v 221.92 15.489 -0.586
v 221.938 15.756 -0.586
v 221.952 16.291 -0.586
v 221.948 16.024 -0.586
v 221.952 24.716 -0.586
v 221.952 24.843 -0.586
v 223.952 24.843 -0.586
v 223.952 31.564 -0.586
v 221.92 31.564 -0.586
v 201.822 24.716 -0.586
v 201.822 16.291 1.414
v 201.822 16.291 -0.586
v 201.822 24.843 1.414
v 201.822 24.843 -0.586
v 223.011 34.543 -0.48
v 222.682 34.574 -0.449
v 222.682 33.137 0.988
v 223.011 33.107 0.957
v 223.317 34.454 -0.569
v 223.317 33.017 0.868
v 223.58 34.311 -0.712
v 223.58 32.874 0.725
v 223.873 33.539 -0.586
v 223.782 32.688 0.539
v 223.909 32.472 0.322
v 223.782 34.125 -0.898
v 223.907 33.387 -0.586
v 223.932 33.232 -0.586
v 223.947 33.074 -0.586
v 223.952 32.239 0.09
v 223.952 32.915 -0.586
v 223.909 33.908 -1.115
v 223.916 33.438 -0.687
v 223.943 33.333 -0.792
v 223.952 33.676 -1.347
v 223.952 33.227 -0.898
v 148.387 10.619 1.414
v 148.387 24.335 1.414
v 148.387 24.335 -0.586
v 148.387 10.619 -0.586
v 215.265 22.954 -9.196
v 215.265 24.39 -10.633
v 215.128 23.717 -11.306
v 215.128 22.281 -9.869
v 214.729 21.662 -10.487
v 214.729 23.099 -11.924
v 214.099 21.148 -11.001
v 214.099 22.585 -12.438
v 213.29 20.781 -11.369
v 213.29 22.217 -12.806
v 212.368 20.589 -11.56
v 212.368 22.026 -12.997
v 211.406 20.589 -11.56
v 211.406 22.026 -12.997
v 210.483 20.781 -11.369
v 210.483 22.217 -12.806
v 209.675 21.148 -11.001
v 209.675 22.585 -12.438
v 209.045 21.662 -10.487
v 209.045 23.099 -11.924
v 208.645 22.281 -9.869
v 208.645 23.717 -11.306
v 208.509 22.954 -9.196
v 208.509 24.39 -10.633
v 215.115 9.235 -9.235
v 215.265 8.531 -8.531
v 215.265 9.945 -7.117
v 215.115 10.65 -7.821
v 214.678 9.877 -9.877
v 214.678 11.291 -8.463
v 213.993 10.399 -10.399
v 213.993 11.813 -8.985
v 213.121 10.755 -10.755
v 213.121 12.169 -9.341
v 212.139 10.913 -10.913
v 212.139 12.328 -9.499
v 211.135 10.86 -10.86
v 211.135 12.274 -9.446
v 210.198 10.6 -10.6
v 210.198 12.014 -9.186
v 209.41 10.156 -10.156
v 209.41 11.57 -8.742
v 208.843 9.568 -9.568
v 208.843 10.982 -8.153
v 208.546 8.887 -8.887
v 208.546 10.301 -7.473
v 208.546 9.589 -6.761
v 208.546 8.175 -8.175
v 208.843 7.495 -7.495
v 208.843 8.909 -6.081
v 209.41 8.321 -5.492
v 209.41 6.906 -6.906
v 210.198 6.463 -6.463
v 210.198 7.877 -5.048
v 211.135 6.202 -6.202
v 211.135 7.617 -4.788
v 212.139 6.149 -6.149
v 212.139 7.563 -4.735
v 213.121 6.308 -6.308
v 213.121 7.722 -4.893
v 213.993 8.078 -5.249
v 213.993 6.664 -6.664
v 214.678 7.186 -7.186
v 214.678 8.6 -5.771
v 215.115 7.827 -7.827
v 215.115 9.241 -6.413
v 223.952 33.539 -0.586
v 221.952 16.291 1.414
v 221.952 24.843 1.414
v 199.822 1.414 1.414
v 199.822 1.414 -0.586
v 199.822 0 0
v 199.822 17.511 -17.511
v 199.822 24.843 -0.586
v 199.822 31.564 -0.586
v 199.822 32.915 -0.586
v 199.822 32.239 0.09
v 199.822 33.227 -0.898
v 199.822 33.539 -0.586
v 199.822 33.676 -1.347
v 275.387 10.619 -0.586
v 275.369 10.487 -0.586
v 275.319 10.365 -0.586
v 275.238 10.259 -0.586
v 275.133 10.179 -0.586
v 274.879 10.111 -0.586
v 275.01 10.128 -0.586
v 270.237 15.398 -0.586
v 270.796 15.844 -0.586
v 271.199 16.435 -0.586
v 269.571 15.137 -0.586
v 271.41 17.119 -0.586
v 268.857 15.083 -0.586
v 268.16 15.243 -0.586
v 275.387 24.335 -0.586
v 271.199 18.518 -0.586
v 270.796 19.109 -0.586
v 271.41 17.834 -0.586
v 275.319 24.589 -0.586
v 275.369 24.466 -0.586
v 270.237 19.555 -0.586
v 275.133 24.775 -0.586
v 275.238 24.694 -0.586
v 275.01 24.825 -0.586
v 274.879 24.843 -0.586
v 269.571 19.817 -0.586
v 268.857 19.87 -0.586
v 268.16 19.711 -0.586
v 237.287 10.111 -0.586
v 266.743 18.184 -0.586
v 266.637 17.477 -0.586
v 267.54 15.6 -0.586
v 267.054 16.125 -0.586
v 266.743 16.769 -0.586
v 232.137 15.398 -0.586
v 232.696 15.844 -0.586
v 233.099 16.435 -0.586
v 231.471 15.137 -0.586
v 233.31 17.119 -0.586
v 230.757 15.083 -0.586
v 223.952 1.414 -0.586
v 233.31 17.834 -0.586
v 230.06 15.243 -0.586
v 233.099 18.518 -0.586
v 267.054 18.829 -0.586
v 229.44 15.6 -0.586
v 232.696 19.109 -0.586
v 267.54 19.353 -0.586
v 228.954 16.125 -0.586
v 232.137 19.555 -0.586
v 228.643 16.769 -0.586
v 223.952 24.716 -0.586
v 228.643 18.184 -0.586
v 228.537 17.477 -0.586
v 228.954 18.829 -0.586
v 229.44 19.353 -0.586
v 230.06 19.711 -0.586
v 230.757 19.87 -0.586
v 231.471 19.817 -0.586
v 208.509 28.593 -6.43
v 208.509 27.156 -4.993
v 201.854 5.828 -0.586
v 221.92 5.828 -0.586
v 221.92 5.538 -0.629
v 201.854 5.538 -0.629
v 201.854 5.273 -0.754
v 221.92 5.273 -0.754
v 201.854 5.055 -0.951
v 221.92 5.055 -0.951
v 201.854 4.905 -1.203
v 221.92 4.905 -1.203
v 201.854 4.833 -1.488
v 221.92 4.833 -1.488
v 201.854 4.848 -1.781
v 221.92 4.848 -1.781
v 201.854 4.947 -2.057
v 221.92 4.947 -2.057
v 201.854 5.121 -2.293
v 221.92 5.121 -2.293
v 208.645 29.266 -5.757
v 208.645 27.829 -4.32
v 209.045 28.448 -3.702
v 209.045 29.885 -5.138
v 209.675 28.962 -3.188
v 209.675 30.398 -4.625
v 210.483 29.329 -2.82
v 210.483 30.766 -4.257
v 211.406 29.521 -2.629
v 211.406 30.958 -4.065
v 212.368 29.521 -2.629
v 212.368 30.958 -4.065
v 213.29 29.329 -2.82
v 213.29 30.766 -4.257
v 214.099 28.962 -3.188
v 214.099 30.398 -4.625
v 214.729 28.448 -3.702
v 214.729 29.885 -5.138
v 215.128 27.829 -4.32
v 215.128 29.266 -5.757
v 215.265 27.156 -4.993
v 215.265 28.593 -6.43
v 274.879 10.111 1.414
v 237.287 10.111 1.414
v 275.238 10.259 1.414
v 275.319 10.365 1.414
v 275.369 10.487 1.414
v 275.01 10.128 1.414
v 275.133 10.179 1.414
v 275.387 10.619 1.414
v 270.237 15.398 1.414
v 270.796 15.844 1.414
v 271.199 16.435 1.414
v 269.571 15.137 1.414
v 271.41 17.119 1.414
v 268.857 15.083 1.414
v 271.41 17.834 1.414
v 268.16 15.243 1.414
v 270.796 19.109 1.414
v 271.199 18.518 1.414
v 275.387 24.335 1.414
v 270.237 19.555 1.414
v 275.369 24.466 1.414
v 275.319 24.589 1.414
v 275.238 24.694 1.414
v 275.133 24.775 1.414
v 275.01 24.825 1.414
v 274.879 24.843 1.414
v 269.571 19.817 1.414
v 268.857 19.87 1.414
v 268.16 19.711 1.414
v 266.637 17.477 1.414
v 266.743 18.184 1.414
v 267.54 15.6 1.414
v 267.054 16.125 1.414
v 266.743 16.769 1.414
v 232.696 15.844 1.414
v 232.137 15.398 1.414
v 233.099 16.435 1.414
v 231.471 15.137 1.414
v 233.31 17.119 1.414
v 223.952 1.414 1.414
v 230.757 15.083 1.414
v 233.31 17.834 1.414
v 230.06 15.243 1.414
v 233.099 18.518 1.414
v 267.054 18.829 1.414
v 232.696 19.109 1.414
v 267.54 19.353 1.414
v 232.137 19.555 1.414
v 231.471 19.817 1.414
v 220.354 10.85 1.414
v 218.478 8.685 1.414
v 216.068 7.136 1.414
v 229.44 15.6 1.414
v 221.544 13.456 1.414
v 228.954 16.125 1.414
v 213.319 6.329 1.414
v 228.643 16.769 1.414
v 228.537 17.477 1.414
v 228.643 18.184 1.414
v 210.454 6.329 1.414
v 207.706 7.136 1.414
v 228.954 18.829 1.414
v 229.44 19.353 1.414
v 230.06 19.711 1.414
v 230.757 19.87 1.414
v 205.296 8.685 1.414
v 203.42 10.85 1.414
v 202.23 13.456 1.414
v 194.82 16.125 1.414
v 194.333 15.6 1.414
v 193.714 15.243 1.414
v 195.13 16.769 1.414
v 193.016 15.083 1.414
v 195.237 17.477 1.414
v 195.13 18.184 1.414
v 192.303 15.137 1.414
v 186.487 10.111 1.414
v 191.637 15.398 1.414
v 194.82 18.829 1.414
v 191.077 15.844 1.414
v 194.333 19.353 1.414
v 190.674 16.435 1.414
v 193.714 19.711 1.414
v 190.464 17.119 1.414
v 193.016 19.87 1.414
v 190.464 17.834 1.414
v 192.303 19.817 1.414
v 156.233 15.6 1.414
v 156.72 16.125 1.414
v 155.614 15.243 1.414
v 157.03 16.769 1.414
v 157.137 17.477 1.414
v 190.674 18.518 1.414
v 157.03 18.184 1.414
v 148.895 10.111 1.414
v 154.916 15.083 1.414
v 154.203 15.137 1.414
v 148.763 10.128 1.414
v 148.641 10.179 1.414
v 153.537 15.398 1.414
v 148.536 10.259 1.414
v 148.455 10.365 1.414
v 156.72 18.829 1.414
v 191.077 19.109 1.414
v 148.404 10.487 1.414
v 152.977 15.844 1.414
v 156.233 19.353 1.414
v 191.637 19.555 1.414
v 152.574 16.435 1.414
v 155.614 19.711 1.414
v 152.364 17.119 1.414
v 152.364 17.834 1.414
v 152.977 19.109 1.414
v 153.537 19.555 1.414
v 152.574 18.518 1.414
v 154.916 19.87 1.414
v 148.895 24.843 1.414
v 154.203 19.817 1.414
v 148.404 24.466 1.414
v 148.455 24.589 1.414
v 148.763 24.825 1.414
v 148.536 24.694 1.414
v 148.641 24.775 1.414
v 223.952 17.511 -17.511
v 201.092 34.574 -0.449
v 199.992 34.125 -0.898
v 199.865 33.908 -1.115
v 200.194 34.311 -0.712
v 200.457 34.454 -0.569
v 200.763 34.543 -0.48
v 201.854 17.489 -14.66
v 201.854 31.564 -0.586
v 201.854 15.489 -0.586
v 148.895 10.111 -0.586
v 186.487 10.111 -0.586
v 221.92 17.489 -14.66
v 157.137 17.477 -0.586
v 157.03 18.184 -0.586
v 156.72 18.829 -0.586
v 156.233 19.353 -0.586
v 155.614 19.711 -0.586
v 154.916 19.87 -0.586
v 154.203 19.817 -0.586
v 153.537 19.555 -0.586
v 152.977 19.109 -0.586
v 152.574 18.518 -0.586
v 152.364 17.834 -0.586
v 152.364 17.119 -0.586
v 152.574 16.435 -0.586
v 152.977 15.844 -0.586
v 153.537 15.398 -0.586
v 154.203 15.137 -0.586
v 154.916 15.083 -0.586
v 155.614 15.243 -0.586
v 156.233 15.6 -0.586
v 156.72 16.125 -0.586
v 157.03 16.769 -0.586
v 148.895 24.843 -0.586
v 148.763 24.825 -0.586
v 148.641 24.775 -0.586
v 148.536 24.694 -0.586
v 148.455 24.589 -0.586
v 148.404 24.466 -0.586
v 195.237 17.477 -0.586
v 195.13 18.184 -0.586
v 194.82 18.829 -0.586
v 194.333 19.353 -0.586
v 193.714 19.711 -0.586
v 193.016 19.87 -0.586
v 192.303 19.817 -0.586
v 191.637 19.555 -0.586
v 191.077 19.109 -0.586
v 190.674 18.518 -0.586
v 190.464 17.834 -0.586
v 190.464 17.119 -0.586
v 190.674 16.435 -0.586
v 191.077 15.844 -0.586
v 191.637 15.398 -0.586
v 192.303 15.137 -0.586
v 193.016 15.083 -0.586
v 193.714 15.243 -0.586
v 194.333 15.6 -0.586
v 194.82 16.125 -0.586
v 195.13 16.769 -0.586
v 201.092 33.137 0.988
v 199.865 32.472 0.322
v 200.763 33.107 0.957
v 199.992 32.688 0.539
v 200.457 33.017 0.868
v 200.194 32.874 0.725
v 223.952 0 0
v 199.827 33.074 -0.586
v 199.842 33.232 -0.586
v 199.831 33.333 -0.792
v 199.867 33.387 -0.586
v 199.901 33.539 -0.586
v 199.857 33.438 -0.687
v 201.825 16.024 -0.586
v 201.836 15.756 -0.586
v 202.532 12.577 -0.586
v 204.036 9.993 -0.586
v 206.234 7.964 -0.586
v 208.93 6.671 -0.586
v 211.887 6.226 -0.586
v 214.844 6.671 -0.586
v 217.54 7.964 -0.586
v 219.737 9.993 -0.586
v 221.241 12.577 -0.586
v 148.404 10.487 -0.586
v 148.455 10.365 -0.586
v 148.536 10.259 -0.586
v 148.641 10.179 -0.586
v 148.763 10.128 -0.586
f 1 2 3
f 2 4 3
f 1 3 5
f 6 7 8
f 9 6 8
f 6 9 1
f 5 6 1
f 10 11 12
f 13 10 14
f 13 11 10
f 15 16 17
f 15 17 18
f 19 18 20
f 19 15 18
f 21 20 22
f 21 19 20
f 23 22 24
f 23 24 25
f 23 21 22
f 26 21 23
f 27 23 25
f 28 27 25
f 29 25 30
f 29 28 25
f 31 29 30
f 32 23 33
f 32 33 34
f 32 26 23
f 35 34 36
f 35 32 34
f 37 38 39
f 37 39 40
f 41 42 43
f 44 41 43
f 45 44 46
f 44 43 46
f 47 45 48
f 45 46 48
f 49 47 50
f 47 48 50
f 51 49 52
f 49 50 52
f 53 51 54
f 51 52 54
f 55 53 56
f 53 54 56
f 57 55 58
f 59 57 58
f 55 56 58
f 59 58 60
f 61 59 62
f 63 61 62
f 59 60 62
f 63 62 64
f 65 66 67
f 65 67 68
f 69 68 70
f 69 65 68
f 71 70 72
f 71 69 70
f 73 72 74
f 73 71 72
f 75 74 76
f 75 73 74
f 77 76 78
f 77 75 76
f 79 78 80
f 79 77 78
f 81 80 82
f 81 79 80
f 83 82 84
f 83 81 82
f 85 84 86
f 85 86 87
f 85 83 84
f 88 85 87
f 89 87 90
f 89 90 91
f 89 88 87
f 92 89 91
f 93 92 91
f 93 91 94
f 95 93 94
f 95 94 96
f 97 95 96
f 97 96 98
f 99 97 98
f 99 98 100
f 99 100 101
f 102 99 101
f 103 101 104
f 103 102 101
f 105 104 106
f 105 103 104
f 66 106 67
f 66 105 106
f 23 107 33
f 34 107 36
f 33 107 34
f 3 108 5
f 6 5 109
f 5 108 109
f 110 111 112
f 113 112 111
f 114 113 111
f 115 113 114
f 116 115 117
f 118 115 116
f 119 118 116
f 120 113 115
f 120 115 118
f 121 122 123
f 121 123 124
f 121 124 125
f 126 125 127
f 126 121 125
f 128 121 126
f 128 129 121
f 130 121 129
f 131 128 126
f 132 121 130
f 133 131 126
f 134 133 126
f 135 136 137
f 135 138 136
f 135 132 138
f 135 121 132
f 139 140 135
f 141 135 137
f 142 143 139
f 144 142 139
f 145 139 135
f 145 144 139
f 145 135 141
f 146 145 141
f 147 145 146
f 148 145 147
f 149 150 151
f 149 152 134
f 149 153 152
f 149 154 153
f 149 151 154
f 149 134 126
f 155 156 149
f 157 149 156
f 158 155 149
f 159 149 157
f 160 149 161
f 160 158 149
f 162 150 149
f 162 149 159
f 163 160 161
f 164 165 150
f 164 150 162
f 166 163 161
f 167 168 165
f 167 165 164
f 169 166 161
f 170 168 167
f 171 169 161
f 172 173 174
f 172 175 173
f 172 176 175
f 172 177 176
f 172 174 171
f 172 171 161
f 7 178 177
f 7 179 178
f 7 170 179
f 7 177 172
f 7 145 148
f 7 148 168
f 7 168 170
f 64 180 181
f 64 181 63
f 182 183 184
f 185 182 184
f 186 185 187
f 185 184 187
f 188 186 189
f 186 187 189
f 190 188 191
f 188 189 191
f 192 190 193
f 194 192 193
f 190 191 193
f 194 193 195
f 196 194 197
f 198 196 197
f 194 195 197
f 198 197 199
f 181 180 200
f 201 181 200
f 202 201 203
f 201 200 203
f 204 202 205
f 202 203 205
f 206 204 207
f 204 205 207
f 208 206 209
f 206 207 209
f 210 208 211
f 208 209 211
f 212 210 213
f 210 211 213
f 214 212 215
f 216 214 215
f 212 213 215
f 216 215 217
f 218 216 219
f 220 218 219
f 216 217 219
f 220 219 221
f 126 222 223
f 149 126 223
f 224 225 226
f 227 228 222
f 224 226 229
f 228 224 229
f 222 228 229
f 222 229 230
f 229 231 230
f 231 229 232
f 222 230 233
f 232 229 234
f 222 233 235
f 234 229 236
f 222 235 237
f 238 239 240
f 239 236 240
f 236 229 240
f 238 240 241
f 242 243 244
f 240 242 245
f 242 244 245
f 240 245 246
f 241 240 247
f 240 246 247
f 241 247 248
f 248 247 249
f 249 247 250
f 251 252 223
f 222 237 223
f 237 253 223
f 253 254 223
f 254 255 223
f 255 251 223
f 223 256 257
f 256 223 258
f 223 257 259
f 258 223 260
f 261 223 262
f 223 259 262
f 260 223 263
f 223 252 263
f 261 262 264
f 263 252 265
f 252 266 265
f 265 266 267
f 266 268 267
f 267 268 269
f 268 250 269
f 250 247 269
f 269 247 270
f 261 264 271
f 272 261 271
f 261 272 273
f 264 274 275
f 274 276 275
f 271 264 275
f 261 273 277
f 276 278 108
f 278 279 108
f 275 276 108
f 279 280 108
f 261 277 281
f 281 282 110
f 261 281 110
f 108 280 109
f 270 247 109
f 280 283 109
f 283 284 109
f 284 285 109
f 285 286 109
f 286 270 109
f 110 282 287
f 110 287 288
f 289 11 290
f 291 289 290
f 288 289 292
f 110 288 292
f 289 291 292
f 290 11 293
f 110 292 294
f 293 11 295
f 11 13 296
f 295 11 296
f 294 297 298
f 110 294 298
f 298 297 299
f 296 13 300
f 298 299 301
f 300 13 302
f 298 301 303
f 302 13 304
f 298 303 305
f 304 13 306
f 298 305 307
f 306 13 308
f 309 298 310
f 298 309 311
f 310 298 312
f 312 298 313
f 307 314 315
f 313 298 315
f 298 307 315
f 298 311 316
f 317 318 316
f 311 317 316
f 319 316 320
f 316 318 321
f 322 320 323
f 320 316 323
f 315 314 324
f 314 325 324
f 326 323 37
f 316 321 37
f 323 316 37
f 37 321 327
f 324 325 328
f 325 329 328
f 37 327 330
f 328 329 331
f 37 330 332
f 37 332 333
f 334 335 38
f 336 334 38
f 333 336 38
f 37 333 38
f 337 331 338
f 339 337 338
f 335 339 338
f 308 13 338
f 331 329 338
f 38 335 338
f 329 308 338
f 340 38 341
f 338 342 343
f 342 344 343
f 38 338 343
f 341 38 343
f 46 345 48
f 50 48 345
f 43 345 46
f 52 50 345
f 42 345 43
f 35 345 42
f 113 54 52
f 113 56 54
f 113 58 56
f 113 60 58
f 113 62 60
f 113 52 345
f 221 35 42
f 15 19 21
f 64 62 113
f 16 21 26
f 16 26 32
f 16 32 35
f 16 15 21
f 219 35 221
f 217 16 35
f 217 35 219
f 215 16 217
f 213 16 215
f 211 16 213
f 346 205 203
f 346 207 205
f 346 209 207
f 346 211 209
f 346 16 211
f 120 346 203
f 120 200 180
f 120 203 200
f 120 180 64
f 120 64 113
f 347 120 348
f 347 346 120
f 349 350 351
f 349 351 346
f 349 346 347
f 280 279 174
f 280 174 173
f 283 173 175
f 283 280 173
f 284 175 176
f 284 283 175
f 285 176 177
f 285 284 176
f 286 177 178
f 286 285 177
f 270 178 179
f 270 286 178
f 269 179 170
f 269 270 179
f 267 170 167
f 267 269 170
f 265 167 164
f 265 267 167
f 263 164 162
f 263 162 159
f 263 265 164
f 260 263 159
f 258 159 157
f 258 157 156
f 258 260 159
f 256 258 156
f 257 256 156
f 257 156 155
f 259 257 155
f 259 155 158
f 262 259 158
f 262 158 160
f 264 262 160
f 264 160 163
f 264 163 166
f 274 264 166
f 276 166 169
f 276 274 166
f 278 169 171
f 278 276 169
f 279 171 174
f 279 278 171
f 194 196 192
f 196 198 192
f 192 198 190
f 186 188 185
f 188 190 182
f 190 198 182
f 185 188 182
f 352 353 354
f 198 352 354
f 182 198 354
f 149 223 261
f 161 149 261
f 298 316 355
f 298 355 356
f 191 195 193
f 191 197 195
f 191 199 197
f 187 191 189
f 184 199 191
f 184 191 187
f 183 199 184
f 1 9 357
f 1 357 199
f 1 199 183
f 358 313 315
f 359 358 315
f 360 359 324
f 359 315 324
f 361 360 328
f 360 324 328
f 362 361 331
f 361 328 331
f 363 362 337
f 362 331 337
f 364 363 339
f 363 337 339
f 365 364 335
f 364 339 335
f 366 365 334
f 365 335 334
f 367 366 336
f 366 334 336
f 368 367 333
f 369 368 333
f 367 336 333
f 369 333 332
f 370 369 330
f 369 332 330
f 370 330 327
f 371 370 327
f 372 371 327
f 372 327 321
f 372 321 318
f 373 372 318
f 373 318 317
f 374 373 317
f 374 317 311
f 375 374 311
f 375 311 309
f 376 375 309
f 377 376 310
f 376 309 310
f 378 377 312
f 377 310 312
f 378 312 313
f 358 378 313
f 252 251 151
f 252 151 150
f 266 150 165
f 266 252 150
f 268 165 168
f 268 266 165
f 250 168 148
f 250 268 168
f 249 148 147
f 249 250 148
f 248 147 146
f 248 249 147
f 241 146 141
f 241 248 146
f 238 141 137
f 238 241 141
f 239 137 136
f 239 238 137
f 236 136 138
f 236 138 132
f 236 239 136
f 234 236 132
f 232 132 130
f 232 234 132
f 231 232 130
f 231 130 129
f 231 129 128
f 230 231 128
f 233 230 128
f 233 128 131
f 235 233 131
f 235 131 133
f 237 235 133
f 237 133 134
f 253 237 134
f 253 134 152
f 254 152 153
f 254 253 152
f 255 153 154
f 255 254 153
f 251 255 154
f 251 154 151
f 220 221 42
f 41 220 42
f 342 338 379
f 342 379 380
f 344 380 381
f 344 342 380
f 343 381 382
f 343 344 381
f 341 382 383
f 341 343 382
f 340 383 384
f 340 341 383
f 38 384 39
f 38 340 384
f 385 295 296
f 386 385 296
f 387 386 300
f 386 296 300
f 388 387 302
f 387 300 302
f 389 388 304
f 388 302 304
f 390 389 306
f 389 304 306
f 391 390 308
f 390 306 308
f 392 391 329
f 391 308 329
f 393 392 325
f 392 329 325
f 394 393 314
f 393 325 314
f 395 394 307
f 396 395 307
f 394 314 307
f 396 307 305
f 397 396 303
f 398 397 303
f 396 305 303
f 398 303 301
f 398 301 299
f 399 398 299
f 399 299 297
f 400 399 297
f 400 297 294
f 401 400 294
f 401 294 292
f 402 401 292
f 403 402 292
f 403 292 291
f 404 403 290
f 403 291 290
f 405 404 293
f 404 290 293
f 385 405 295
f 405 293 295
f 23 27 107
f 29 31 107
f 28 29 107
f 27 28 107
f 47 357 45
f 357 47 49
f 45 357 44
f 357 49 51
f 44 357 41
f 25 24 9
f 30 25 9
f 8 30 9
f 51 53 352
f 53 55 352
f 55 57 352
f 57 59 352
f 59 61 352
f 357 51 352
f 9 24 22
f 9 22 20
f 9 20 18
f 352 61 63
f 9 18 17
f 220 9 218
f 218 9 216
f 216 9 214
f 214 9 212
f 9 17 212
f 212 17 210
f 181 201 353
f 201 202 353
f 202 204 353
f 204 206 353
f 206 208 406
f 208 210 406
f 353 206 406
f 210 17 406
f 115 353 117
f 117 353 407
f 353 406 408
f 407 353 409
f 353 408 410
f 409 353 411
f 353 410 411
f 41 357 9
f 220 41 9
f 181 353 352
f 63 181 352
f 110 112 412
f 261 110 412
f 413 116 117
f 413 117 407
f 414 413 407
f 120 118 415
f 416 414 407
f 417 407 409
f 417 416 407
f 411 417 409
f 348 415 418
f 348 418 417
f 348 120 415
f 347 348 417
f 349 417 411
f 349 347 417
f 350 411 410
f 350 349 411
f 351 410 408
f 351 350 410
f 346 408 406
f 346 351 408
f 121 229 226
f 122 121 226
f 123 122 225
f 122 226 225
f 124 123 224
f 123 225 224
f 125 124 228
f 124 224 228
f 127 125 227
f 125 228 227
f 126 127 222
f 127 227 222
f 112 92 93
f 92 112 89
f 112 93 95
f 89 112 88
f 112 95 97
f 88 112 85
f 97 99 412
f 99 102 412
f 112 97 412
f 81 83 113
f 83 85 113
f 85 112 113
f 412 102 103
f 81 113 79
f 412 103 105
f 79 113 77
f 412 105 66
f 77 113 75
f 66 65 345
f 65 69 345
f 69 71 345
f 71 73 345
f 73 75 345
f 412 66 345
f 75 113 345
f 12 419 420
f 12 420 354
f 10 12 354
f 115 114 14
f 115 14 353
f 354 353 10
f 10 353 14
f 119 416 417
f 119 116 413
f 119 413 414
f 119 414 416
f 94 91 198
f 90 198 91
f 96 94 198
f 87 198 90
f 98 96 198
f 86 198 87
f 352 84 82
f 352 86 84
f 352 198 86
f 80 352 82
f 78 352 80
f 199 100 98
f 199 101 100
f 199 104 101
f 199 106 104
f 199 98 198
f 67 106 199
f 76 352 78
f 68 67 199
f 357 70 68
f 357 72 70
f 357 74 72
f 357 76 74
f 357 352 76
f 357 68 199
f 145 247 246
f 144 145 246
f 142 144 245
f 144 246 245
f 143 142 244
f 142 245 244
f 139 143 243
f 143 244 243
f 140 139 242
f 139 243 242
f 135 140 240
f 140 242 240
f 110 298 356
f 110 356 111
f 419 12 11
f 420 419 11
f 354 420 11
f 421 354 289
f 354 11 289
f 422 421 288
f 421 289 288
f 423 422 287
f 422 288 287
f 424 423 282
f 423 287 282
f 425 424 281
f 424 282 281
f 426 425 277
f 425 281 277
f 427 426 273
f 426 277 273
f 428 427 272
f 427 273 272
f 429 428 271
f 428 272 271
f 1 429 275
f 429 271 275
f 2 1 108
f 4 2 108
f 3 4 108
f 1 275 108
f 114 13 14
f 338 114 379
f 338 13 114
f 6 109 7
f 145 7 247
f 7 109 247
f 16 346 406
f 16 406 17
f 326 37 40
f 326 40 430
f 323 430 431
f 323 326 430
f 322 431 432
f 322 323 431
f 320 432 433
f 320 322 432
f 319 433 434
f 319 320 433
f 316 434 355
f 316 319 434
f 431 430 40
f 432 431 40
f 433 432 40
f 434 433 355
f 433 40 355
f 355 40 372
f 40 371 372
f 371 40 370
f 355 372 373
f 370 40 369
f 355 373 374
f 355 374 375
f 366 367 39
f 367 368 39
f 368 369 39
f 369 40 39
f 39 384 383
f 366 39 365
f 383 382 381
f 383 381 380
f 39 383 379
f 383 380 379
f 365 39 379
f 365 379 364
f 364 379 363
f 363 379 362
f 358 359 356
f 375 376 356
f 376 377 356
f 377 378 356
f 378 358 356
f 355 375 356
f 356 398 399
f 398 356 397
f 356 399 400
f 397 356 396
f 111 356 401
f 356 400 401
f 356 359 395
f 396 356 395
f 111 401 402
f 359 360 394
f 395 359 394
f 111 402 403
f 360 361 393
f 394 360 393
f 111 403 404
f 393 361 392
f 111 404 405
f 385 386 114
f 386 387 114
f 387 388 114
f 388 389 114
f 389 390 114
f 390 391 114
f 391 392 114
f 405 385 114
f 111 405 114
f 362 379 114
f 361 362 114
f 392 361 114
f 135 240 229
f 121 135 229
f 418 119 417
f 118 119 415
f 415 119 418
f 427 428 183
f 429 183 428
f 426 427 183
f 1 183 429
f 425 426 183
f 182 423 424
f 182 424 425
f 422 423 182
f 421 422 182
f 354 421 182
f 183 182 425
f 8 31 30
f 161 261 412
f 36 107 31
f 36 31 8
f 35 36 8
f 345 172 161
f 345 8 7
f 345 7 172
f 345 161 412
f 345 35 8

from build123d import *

# Parameters (mm, degrees)
SKETCH_W             = 24.13
SKETCH_H             = 24.13
SKETCH_R             = 3.3782
PAD_DEPTH            = 2
PAD001_DEPTH         = 12.065
SKETCH002_R          = 6.35
POCKET_DEPTH         = 22.7167864376
PAD002_DEPTH         = 2
SKETCH004_R          = 2.4
PAD003_DEPTH         = 2
POCKET001_DEPTH      = 2.54
FILLET_R             = 0.508
BODY_PLACEMENT_ANGLE = 315
SKETCH010_R          = 2.4
PAD007_DEPTH         = 2
PAD008_DEPTH         = 2.032
PAD009_DEPTH         = 2.032


with BuildPart() as part:
    # Sketch → Pad (new body)
    with BuildSketch(Plane.XY):
        with Locations((0, 12.065)):
            Rectangle(SKETCH_W, SKETCH_H)
        with Locations((0, 12.065)):
            Circle(SKETCH_R, mode=Mode.SUBTRACT)
    extrude(amount=PAD_DEPTH)

    # Sketch001 → Pad001 (join, symmetric)
    with BuildSketch(Plane.YZ):
        with BuildLine():
            Line((0, 2), (22.7157864376, 24.7157864376))
            Line((22.7157864376, 24.7157864376), (24.13, 23.3015728753))
            Line((24.13, 23.3015728753), (4.5355339059, 3.7071067812))
            ThreePointArc((4.5355339059, 3.7071067812), (4.3187611546, 2.6173165676), (5.2426406871, 2))
            Line((5.2426406871, 2), (0, 2))
        make_face()
    extrude(amount=PAD001_DEPTH, both=True)

    # Sketch002 (on Face7 of Pad001) → Pocket (cut, through all)
    with BuildSketch(Plane.XY.offset(2)):
        with Locations((0, 12.065)):
            Circle(SKETCH002_R)
    extrude(amount=POCKET_DEPTH, mode=Mode.SUBTRACT)

    # Sketch003 (on Face9 of Pocket) → Pad002 (join)
    with BuildSketch(Plane.YZ.offset(12.065)):
        with BuildLine():
            ThreePointArc((17.8909137548, 17.06248663), (15.9782409773, 7.4468312404), (24.13, 2))
            Line((2.8284271247, 2), (24.13, 2))
            Line((17.8909137548, 17.06248663), (2.8284271247, 2))
        make_face()
    pad002 = extrude(amount=-PAD002_DEPTH)

    # Mirrored: Pad002 across YZ
    add(pad002.mirror(Plane.YZ))

    # Sketch004 (on Face5 of Mirrored) → Pad003 (join)
    with BuildSketch(Plane(origin=(0, -1, 1), x_dir=(1, 0, 0), z_dir=(0, -0.7071067812, 0.7071067812))):
        Polygon((-12.065, 33.5391868224), (-25.4, 24.8427001924), (-25.4, 10.1107001924), (-12.065, 1.4142135624), align=None)
        with Locations((-19.05, 17.4767001924)):
            Circle(SKETCH004_R, mode=Mode.SUBTRACT)
    pad003 = extrude(amount=-PAD003_DEPTH)

    # Mirrored001: Pad003 across Sketch004 V_Axis
    add(pad003.mirror(Plane(origin=(0, -1, 1), x_dir=(0, -0.7071067812, 0.7071067812), z_dir=(1, 0, 0))))

    # Sketch006 (on Face5 of Mirrored001) → Pocket001 (cut)
    with BuildSketch(Plane(origin=(0, -1, 1), x_dir=(1, 0, 0), z_dir=(0, -0.7071067812, 0.7071067812))):
        with BuildLine():
            Line((25.4, 24.8427001924), (25.4, 33.5391868224))
            Line((25.4, 33.5391868224), (-25.4, 33.5391868224))
            Line((-25.4, 33.5391868224), (-25.4, 24.8427001924))
            Line((-25.4, 24.8427001924), (-10.065, 24.8427001924))
            Line((-10.065, 16.2914440713), (-10.065, 24.8427001924))
            ThreePointArc((-10.065, 16.2914440713), (0, 6.2264440713), (10.065, 16.2914440713))
            Line((10.065, 16.2914440713), (10.065, 24.8427001924))
            Line((10.065, 24.8427001924), (25.4, 24.8427001924))
        make_face()
    extrude(amount=-POCKET001_DEPTH, mode=Mode.SUBTRACT)

    # Fillet
    fillet_edges = [part.edges().sort_by_distance(p)[0] for p in [
        (-25.4, 17.273549, 17.859335),
        (25.4, 17.273549, 17.859335),
    ]]
    fillet(fillet_edges, radius=FILLET_R)


with BuildPart() as part_1:
    # Body placement: moved
    add(part.part.rotate(Axis((0, 0, 0), (1, 0, 0)), BODY_PLACEMENT_ANGLE))

    # Sketch010 (on Face11 of Clone) → Pad007 (new body)
    with BuildSketch(Plane.XY.offset(1.4142135624)):
        with BuildLine():
            Line((-24.892, 24.8427001924), (-62.992, 24.8427001924))
            ThreePointArc((-62.992, 24.8427001924), (-63.3512102448, 24.6939104372), (-63.5, 24.3347001924))
            Line((-63.5, 24.3347001924), (-63.5, 10.6187001924))
            ThreePointArc((-63.5, 10.6187001924), (-63.3512102448, 10.2594899476), (-62.992, 10.1107001924))
            Line((-62.992, 10.1107001924), (-24.892, 10.1107001924))
            Line((-24.892, 10.1107001924), (-24.892, 24.8427001924))
        make_face()
        with Locations((-57.15, 17.4767001924)):
            Circle(SKETCH010_R, mode=Mode.SUBTRACT)
    pad007 = extrude(amount=-PAD007_DEPTH)

    # Mirrored003: Pad007 across Sketch010 V_Axis
    add(pad007.mirror(Plane(origin=(0, 0, 1.4142135624), x_dir=(0, 0, 1), z_dir=(1, 0, 0))))

    # Sketch011 (on Face21 of Mirrored003) → Pad008 (join)
    with BuildSketch(Plane(origin=(0, 17.5114994361, -17.5114994361), x_dir=(-1, 0, 0), z_dir=(0, 0.7071067812, -0.7071067812))):
        with BuildLine():
            Line((12.065, 0), (12.065, 22.86))
            ThreePointArc((12.065, 22.86), (11.6930256121, 23.7580256121), (10.795, 24.13))
            Line((10.795, 24.13), (-10.795, 24.13))
            ThreePointArc((-10.795, 24.13), (-11.6930256121, 23.7580256121), (-12.065, 22.86))
            Line((-12.065, 22.86), (-12.065, 0))
            Line((12.065, 0), (-12.065, 0))
        make_face()
        with BuildLine():
            ThreePointArc((3.3782, 15.6718), (0, 19.05), (-3.3782, 15.6718))
            Line((-3.3782, 15.6718), (-3.3782, 9.7282))
            ThreePointArc((-3.3782, 9.7282), (0, 6.35), (3.3782, 9.7282))
            Line((3.3782, 15.6718), (3.3782, 9.7282))
        make_face(mode=Mode.SUBTRACT)
    extrude(amount=-PAD008_DEPTH)

    # Sketch012 (on Face13 of Pad008) → Pad009 (join)
    with BuildSketch(Plane(origin=(-12.065, 0, 0), x_dir=(0, -0.7071067812, 0.7071067812), z_dir=(-1, 0, 0))):
        Polygon((-24.13, 2), (-2.8284271247, 2), (-24.13, 23.3015728753), align=None)
    pad009 = extrude(amount=-PAD009_DEPTH)

    # Mirrored004: Pad009 across YZ
    add(pad009.mirror(Plane.YZ))


with BuildPart() as part_2:
    # Body002 placement: moved
    add(part_1.part.moved(Location((211.8868, 0, 0))))


solid = part_2.part
